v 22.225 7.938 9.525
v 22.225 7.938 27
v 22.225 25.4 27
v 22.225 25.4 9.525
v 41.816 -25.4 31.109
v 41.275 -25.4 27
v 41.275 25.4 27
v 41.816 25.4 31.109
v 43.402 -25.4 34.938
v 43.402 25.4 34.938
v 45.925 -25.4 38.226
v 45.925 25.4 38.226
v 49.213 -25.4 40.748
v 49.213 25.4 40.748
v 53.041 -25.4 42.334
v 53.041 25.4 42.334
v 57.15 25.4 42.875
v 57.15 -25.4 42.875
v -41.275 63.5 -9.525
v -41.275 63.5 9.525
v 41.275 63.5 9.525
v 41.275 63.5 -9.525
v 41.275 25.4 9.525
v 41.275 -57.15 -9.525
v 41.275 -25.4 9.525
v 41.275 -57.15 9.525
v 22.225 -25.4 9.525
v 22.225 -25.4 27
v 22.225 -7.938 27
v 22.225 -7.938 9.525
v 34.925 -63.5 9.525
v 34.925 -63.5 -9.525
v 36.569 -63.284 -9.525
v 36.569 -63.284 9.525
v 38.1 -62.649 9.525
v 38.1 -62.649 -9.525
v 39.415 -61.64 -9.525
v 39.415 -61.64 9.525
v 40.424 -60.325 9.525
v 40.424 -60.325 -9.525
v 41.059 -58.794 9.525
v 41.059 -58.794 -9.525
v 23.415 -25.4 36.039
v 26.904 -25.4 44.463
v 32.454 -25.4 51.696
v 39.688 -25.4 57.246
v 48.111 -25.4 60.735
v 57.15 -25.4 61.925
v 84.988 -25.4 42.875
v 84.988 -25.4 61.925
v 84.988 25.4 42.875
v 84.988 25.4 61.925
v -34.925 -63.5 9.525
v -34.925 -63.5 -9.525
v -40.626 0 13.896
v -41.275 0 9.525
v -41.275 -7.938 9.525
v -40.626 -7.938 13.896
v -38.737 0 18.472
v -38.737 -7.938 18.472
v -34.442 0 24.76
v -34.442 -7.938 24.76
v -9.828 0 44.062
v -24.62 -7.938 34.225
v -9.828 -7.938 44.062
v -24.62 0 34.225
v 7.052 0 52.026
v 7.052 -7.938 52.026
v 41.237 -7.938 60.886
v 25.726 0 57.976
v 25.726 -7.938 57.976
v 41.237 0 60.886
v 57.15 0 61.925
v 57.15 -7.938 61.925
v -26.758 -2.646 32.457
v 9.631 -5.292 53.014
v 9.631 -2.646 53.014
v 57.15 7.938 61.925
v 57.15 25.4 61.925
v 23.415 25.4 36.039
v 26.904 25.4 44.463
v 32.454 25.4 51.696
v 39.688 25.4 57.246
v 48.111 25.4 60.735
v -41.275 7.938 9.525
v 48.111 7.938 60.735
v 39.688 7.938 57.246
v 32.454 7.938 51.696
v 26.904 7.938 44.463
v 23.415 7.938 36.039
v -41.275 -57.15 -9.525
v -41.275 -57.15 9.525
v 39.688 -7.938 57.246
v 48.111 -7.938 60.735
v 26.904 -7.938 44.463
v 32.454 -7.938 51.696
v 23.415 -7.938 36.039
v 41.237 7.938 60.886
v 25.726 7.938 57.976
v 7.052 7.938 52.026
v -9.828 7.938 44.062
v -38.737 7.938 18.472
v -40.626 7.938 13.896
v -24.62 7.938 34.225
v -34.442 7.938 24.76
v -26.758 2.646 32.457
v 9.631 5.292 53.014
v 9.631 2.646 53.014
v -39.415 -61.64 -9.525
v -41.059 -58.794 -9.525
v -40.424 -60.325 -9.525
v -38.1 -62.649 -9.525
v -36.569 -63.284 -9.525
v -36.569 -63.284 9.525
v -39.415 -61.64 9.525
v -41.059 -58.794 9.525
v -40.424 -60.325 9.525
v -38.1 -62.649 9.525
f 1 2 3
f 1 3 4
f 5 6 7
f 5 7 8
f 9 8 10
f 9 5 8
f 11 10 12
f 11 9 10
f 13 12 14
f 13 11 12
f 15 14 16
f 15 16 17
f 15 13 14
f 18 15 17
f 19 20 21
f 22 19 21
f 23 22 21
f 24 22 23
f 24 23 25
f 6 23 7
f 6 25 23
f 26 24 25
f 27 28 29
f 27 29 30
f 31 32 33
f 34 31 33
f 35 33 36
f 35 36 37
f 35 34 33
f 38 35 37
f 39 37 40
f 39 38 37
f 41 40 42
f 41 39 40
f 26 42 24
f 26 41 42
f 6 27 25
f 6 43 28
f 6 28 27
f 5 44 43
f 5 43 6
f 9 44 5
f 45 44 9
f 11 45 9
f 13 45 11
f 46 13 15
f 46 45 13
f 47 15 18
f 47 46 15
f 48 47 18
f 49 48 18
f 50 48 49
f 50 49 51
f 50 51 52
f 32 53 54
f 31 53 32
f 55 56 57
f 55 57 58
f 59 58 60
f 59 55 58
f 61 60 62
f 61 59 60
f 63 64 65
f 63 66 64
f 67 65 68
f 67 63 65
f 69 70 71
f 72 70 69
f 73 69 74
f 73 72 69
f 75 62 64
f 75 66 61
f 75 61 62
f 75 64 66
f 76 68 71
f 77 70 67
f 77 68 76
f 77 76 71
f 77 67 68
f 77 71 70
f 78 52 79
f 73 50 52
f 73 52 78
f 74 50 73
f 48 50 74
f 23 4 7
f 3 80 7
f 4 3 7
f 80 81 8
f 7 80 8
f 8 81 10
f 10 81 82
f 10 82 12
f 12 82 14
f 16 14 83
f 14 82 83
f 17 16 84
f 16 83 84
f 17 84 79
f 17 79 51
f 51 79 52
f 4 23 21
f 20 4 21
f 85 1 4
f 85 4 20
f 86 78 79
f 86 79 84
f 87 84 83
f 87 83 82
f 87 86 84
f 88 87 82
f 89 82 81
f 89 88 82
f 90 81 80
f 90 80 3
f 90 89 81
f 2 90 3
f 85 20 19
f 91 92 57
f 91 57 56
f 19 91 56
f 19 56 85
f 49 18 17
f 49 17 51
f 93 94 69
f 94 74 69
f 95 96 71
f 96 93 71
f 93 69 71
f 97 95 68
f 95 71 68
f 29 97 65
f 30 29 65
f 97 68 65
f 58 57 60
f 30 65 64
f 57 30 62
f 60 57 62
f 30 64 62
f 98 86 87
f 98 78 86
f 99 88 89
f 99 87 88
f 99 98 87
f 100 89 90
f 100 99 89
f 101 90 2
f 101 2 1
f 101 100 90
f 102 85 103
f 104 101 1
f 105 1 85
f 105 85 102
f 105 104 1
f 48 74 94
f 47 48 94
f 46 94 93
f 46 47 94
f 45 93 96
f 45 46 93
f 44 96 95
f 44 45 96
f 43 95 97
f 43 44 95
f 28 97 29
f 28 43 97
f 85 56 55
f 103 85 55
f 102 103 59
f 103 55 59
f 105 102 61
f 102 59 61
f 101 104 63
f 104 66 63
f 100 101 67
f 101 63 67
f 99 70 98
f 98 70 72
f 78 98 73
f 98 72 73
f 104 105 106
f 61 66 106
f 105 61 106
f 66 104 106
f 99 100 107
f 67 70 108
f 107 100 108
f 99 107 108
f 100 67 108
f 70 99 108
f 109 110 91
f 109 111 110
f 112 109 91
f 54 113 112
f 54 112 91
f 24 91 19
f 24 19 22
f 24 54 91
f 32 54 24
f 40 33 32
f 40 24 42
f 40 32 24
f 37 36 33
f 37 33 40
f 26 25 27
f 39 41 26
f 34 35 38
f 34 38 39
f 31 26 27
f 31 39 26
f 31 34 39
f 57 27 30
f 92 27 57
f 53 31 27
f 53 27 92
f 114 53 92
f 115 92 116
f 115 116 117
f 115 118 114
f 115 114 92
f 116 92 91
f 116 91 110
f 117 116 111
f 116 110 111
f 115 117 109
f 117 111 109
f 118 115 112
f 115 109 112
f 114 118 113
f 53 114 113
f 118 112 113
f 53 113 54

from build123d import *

# Parameters (mm, degrees)
F1_DEPTH = 63.5
F0_W     = 24.663166
F0_H     = 19.05
F2_DEPTH = 25.4
F3_DEPTH = 7.9375
F4_R     = 6.35


with BuildPart() as f1:
    # F0 (on Front) → F1 (new body, symmetric)
    with BuildSketch(Plane.XZ):
        Polygon((-41.275, 9.525), (-41.275, -9.525), (41.275, -9.525), (41.275, 9.525), (22.225, 9.525), align=None)
    extrude(amount=F1_DEPTH, both=True)

    # F0 (on Front) → F2 (join, symmetric)
    with BuildSketch(Plane.XZ):
        with BuildLine():
            Line((22.225, 9.525), (41.275, 9.525))
            Line((41.275, 9.525), (41.275, 27.0002))
            ThreePointArc((41.275, 27.0002), (45.92468, 38.22552), (57.15, 42.8752))
            Line((57.15, 42.8752), (60.325, 42.8752))
            Line((60.325, 42.8752), (60.325, 61.9252))
            Line((60.325, 61.9252), (57.15, 61.9252))
            ThreePointArc((57.15, 61.9252), (32.454296, 51.695904), (22.225, 27.0002))
            Line((22.225, 27.0002), (22.225, 9.525))
        make_face()
        with Locations((72.656583, 52.4002)):
            Rectangle(F0_W, F0_H)
    extrude(amount=F2_DEPTH, both=True)

    # F0 (on Front) → F3 (join, symmetric)
    with BuildSketch(Plane.XZ):
        with BuildLine():
            add(Edge.make_bspline(
                [(-41.275, 9.525), (-41.275, 30.556278), (7.645971, 61.9252), (57.15, 61.9252)],
                knots=[0, 0, 0, 0, 111.504536, 111.504536, 111.504536, 111.504536], degree=3))
            Line((-41.275, 9.525), (22.225, 9.525))
            Line((22.225, 9.525), (22.225, 27.0002))
            ThreePointArc((22.225, 27.0002), (32.454296, 51.695904), (57.15, 61.9252))
        make_face()
    extrude(amount=F3_DEPTH, both=True)

    # F4
    f4_edges = [f1.edges().sort_by_distance(p)[0] for p in [
        (-41.275, -63.5, 0),
        (41.275, -63.5, 0),
    ]]
    fillet(f4_edges, radius=F4_R)


solid = f1.part
